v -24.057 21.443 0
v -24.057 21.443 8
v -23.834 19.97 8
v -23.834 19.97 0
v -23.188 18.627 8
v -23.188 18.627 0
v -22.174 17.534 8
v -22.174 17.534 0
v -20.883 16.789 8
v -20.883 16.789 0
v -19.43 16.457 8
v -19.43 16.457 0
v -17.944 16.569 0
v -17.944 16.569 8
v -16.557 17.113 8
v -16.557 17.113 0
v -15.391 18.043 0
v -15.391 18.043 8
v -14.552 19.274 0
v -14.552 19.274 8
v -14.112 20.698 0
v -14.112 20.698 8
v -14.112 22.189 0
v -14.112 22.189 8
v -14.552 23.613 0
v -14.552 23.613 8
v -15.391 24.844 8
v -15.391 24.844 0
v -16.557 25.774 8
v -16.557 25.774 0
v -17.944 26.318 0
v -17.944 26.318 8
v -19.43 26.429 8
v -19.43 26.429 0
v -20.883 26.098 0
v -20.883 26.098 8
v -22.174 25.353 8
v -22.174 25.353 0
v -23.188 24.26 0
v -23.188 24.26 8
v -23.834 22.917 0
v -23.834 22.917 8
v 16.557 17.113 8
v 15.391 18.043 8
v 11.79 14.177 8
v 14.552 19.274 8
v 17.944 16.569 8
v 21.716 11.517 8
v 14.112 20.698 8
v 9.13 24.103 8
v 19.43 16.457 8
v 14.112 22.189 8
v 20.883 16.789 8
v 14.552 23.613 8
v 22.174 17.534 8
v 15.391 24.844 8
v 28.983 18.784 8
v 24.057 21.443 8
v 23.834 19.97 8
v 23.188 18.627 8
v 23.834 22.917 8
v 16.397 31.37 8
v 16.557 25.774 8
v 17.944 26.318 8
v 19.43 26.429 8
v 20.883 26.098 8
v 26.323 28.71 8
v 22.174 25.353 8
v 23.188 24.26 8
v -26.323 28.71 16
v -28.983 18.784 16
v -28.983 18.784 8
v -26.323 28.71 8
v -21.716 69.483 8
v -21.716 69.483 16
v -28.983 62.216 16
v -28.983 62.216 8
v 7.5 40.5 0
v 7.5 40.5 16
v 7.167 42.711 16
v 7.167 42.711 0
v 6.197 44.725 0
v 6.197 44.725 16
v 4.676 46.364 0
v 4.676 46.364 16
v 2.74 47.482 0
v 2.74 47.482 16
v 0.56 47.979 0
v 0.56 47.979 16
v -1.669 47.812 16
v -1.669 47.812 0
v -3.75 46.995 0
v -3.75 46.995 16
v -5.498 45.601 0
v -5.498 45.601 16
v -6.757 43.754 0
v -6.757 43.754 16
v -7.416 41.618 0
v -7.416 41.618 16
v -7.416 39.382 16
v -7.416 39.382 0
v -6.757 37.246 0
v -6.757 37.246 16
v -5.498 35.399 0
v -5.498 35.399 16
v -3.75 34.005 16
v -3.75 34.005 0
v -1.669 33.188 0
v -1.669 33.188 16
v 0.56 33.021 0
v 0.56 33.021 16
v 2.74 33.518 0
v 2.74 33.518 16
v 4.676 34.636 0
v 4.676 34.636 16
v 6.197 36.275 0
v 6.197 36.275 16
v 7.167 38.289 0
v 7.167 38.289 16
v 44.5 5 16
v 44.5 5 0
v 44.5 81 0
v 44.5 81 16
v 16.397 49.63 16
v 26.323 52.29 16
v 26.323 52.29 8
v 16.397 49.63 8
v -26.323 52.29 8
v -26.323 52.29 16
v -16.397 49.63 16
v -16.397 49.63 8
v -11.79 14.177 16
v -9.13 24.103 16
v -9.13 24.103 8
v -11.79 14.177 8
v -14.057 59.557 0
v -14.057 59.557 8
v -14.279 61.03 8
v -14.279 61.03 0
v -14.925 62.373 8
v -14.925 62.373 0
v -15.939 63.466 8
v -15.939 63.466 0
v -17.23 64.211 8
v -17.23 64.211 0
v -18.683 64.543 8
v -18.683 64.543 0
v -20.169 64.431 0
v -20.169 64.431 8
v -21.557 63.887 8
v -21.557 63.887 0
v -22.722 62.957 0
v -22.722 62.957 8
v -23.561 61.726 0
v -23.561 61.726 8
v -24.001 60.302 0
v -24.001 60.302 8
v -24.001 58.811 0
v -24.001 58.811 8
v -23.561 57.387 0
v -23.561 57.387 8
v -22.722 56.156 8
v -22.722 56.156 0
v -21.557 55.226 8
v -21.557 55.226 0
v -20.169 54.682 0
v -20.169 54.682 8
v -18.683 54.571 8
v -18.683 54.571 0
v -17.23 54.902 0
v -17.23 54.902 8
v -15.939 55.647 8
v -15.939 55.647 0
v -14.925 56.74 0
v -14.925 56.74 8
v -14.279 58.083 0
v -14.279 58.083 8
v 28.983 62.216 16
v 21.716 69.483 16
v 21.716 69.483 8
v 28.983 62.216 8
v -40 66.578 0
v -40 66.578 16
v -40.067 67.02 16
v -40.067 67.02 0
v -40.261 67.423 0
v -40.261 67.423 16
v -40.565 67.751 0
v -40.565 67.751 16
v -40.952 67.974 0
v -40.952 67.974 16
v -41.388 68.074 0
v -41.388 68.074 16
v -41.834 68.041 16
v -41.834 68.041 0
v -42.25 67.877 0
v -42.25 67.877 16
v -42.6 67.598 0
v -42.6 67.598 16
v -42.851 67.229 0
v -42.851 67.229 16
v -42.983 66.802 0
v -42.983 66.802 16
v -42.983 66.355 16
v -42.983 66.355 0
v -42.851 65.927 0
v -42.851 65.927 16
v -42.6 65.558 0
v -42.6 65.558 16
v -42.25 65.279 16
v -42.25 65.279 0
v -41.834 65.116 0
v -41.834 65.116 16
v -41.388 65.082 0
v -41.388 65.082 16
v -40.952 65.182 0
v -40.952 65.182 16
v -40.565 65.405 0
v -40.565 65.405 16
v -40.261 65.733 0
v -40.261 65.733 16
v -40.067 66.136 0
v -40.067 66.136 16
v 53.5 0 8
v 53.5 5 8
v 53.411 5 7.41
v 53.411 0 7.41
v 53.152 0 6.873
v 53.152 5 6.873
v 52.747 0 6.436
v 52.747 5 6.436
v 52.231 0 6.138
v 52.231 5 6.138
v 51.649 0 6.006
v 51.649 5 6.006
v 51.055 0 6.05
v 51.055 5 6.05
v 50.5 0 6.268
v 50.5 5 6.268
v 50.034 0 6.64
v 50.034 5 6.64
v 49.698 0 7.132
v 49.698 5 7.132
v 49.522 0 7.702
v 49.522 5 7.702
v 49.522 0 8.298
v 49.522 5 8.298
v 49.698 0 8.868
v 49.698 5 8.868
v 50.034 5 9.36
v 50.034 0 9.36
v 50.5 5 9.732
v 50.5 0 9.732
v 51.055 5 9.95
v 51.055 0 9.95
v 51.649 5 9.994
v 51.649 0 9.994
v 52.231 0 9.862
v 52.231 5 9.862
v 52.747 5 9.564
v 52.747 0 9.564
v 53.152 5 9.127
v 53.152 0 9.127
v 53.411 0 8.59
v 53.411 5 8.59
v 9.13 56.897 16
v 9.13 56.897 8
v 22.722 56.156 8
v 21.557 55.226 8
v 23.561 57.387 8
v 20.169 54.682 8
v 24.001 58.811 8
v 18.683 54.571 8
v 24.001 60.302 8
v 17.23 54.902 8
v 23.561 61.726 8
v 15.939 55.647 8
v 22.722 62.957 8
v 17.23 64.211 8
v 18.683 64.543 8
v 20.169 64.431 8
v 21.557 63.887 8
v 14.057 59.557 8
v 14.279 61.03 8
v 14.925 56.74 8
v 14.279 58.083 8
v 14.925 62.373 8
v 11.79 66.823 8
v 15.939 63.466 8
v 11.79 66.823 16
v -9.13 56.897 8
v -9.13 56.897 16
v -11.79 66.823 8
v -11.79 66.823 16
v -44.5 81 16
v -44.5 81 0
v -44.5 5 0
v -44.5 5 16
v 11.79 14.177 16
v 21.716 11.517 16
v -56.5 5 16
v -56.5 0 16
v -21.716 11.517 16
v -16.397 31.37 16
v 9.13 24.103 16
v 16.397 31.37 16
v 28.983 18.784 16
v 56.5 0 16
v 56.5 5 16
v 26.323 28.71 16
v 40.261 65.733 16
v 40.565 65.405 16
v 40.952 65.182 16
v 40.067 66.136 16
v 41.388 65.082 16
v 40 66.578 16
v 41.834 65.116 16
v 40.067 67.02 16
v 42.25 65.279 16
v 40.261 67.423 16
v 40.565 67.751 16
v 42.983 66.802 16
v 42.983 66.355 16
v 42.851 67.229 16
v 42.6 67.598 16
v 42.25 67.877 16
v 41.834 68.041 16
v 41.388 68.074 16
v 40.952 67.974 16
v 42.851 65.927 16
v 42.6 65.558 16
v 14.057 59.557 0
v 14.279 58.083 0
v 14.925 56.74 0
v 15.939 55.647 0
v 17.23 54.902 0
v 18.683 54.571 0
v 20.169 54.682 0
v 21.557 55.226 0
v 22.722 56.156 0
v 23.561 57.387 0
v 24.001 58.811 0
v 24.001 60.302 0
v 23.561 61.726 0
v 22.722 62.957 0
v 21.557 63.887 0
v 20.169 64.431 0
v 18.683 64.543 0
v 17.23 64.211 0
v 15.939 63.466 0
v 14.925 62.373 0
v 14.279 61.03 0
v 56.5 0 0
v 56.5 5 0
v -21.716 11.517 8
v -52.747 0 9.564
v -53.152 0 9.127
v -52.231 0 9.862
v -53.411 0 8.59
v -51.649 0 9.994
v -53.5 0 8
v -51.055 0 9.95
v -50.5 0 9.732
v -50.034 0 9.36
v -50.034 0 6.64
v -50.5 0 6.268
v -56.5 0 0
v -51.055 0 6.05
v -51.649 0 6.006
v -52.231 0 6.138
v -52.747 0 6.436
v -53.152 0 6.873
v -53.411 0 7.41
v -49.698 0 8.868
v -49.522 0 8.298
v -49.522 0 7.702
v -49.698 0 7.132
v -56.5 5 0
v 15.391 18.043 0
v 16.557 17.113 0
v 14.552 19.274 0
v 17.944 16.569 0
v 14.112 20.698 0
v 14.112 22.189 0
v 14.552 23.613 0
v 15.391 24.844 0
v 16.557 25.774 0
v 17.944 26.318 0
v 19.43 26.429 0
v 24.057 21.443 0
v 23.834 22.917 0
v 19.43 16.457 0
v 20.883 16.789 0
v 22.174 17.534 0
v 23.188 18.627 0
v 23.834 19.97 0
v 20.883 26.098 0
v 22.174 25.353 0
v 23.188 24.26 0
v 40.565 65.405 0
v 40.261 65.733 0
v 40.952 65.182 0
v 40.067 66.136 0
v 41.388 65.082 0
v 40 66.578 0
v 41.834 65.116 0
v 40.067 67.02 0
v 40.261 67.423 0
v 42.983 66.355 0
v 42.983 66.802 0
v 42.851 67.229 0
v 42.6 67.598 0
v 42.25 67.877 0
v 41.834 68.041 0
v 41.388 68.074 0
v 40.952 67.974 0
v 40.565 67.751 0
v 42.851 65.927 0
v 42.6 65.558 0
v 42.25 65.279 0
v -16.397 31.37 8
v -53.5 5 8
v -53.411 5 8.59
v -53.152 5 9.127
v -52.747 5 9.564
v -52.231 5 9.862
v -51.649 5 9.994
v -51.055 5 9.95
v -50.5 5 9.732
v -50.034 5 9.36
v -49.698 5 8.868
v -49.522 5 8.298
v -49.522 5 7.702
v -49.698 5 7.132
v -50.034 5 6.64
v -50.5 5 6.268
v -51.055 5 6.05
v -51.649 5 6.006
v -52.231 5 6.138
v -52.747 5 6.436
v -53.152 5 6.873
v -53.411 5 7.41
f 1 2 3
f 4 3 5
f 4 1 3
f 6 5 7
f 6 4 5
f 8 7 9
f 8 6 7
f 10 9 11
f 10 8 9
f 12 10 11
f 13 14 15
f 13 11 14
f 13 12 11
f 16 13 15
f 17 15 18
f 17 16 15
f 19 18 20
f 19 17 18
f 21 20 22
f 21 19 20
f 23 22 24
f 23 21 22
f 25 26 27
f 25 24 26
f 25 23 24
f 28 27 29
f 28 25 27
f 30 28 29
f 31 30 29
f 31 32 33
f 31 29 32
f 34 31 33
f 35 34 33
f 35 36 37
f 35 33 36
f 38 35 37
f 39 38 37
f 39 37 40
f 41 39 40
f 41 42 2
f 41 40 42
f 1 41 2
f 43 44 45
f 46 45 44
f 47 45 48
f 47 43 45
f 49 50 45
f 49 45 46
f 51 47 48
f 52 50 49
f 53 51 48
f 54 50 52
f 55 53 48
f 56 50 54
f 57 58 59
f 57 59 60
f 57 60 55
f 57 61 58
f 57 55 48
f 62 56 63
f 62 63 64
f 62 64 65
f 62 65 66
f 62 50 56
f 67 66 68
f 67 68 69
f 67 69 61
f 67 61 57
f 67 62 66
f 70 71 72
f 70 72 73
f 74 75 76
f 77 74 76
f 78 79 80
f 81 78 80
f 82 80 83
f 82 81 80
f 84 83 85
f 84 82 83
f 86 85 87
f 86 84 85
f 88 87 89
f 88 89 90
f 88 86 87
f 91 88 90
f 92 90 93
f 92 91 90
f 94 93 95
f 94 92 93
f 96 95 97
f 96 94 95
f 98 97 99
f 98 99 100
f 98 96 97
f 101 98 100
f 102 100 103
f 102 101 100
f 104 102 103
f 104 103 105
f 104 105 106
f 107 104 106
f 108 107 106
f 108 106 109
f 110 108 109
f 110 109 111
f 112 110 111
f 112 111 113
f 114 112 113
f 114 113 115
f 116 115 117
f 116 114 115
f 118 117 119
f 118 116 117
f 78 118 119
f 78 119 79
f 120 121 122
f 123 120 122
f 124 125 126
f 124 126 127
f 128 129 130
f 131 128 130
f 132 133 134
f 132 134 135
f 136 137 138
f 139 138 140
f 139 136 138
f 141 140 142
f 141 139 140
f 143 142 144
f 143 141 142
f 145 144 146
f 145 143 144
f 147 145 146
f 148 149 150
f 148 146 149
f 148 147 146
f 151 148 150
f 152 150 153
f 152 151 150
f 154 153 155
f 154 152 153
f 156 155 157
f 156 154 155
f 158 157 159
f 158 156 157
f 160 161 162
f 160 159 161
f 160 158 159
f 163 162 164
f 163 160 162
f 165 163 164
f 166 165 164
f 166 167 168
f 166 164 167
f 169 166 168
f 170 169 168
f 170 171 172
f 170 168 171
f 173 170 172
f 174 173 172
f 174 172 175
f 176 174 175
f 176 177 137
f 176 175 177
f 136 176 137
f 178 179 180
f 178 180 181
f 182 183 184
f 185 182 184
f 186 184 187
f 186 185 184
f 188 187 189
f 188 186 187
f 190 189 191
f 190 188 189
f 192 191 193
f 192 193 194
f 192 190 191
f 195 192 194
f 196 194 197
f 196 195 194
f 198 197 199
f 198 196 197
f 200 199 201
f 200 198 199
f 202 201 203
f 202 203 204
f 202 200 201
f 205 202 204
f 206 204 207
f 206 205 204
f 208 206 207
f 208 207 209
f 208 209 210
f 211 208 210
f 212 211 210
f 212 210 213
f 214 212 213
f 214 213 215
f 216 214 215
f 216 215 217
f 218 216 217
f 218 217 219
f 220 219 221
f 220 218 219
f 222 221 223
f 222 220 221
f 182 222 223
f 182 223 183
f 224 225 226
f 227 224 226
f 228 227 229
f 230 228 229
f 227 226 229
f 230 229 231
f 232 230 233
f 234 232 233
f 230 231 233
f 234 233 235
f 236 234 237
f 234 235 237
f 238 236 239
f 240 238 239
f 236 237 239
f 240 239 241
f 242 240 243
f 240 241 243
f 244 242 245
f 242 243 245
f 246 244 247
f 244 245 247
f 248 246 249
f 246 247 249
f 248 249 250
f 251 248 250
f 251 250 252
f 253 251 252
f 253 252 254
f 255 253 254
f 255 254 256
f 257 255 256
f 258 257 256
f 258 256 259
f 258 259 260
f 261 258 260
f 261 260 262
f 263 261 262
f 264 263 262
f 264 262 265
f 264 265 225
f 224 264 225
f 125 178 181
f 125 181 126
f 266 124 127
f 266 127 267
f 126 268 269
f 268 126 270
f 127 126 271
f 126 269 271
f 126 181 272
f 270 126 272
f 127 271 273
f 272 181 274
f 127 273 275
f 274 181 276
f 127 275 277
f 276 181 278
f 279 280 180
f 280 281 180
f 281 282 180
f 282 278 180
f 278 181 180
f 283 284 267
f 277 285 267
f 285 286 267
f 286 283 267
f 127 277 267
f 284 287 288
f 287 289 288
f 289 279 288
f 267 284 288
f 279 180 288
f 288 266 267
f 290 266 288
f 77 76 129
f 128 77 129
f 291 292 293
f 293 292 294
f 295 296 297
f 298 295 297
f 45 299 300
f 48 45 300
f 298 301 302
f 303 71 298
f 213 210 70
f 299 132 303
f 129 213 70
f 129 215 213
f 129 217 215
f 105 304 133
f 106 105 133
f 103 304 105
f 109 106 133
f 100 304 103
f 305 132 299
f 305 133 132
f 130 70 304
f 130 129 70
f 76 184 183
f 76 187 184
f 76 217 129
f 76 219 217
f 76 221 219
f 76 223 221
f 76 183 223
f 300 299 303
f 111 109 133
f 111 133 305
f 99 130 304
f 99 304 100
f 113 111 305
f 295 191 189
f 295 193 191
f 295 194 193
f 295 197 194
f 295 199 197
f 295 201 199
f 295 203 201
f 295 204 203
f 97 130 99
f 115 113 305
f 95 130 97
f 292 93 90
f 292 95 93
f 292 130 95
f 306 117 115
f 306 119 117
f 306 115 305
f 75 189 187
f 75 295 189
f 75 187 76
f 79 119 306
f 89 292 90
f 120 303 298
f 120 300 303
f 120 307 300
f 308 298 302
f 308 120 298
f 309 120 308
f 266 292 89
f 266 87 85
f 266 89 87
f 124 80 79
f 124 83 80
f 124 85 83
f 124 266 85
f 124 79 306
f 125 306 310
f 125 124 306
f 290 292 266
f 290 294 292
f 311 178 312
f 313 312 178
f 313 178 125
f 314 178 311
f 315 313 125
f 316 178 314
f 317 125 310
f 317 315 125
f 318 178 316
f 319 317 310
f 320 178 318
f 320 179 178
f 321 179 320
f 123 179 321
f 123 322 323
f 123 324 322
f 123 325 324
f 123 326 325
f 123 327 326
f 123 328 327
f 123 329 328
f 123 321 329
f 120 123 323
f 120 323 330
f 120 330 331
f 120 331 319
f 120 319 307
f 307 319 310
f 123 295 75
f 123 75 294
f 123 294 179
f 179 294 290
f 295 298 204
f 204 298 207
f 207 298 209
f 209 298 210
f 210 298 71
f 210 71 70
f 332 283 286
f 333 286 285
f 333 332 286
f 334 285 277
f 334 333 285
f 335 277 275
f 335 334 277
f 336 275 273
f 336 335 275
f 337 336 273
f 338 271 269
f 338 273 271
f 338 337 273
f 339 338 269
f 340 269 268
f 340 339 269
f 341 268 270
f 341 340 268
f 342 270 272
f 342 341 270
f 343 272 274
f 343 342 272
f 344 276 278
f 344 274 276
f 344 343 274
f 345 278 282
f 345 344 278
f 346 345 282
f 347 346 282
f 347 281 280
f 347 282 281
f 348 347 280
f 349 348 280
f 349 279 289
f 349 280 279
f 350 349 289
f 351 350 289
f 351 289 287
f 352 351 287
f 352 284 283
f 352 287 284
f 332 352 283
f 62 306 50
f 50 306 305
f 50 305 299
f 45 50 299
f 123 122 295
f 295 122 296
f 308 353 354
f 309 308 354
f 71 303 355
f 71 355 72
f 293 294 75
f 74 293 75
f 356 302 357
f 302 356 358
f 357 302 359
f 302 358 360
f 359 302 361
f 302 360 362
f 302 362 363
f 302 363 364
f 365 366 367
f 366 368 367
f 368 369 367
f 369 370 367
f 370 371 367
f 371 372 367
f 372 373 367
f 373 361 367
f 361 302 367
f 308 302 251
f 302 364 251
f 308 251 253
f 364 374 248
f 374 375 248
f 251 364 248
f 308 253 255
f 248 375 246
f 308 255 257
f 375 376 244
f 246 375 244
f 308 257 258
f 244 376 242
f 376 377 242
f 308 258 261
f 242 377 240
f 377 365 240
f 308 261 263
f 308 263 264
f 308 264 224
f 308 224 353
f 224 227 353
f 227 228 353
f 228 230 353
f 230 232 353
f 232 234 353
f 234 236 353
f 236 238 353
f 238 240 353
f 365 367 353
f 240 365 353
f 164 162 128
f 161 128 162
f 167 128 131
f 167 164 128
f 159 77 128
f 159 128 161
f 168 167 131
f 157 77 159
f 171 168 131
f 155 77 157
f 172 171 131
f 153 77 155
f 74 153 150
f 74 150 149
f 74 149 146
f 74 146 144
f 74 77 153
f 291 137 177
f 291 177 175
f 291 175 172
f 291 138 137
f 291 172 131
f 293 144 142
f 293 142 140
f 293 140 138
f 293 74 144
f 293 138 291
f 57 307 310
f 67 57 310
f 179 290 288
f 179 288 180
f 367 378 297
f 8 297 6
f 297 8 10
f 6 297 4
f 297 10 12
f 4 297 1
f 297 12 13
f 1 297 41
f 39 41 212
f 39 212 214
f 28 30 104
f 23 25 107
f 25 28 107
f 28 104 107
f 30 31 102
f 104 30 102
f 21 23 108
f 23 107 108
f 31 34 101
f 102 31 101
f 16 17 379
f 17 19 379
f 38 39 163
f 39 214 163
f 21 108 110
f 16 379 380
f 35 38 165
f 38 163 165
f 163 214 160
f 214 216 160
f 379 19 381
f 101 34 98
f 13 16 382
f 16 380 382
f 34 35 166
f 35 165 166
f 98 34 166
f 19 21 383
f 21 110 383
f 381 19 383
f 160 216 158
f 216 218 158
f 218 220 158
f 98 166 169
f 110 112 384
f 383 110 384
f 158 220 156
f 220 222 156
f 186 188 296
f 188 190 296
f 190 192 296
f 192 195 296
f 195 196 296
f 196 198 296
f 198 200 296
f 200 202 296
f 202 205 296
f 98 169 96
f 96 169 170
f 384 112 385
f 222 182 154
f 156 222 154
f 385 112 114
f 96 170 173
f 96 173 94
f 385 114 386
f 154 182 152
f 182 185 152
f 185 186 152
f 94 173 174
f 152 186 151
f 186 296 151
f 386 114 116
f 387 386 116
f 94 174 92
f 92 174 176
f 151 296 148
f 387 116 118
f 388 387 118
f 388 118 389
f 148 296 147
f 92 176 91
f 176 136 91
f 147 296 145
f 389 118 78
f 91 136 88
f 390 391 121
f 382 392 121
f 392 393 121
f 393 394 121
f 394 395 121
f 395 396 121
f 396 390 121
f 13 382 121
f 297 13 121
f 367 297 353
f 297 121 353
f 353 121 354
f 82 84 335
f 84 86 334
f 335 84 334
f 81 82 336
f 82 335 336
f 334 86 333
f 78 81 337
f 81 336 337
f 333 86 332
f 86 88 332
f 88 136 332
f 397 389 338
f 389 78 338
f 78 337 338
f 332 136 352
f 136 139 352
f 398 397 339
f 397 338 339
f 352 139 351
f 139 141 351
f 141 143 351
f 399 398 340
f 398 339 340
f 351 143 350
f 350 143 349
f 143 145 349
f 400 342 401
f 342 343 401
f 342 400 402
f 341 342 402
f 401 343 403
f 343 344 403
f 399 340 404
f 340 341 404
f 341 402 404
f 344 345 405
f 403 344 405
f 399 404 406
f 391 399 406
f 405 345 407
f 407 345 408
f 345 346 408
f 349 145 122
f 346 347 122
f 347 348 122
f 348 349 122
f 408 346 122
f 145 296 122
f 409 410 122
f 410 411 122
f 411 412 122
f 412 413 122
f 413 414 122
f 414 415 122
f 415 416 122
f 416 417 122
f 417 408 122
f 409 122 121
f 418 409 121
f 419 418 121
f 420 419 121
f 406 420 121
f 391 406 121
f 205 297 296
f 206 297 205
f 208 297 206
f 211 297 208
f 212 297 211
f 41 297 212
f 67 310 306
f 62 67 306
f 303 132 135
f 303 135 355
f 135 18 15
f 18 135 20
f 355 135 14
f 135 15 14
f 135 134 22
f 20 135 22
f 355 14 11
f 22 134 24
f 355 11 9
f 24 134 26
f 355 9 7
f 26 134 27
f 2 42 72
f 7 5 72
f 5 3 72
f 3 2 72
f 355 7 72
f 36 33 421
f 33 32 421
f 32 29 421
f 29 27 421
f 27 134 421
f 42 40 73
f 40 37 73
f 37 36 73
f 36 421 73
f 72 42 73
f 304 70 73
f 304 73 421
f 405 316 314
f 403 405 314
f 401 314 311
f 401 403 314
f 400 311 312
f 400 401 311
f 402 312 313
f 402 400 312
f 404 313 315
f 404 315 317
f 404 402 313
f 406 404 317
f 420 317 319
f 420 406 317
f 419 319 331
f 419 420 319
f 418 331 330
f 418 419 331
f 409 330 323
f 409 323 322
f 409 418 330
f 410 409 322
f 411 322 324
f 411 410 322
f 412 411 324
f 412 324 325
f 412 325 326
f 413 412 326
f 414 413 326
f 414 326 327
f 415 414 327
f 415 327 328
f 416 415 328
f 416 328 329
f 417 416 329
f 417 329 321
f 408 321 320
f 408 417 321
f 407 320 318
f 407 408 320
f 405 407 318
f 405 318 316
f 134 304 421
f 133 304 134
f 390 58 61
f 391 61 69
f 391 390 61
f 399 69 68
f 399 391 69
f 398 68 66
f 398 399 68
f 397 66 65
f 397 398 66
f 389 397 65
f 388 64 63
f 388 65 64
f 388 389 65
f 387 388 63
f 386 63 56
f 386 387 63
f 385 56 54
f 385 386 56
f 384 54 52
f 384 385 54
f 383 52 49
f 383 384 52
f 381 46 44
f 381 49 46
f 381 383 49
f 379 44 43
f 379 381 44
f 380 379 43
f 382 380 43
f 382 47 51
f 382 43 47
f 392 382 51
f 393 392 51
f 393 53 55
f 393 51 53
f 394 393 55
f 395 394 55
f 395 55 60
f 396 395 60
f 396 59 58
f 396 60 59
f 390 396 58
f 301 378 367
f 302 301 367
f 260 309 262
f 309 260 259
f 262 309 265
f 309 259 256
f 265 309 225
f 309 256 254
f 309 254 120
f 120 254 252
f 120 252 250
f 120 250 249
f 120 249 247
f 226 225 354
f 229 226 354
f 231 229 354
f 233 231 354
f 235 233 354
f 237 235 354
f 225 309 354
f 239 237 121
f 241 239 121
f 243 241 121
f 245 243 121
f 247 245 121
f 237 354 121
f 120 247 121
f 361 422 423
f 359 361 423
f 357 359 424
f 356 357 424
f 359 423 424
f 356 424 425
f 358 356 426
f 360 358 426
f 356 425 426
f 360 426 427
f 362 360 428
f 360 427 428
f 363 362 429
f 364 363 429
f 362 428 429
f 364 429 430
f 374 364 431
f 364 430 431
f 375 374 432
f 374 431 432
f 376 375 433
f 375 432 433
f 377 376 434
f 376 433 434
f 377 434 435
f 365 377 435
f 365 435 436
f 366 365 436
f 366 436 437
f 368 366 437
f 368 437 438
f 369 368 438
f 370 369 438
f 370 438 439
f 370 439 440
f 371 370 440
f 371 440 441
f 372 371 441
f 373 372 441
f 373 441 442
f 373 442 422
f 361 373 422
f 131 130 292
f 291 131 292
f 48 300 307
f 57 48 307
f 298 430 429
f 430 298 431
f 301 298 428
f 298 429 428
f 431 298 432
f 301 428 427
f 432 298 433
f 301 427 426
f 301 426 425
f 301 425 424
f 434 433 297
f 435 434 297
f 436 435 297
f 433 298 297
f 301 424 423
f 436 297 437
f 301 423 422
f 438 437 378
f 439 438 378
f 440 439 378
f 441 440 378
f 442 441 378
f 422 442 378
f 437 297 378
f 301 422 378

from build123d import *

# Parameters (mm, degrees)
ESQUISSE2_R             = 5
ESQUISSE2_R_2           = 1.5
ESQUISSE2_R_3           = 7.5
BOSS_EXTRU_1_DEPTH      = 16
ESQUISSE4_R             = 2
ENL_V_MAT_EXTRU_1_DEPTH = 6
ENL_V_MAT_EXTRU_2_DEPTH = 8


with BuildPart() as part:
    # Esquisse2 → Boss.-Extru.1 (new body)
    with BuildSketch(Plane.XY):
        Polygon((-56.5, 0), (56.5, 0), (56.5, 5), (44.5, 5), (44.5, 81), (-44.5, 81), (-44.5, 5), (-56.5, 5), align=None)
        with Locations(Location((-19.056527753, 21.443472247, 0), (0, 0, 180))):  # turned: the seam where the file's is
            Circle(ESQUISSE2_R, mode=Mode.SUBTRACT)
        with Locations((-19.056527753, 59.556527753)):
            Circle(ESQUISSE2_R, mode=Mode.SUBTRACT)
        with Locations(Location((19.056527753, 59.556527753, 0), (0, 0, 180))):  # turned: the seam where the file's is
            Circle(ESQUISSE2_R, mode=Mode.SUBTRACT)
        with Locations((19.056527753, 21.443472247)):
            Circle(ESQUISSE2_R, mode=Mode.SUBTRACT)
        with Locations((-41.5, 66.578130392)):
            Circle(ESQUISSE2_R_2, mode=Mode.SUBTRACT)
        with Locations(Location((41.5, 66.578130392, 0), (0, 0, 180))):  # turned: the seam where the file's is
            Circle(ESQUISSE2_R_2, mode=Mode.SUBTRACT)
        with Locations((0, 40.5)):
            Circle(ESQUISSE2_R_3, mode=Mode.SUBTRACT)
    extrude(amount=BOSS_EXTRU_1_DEPTH)

    # Esquisse4 → Enlèv. mat.-Extru.1 (cut, through all)
    with BuildSketch(Plane(origin=(0, 5, 0), x_dir=(1, 0, 0), z_dir=(0, 1, 0))):
        with Locations(Location((-51.5, -8, 0), (0, 0, 180))):  # turned: the seam where the file's is
            Circle(ESQUISSE4_R)
        with Locations((51.5, -8)):
            Circle(ESQUISSE4_R)
    extrude(amount=-ENL_V_MAT_EXTRU_1_DEPTH, mode=Mode.SUBTRACT)

    # Esquisse5 → Enlèv. mat.-Extru.2 (cut)
    with BuildSketch(Plane.XY.offset(16)):
        Polygon((-21.71636832, 69.483187891), (-28.983187891, 62.21636832), (-26.323347323, 52.289708183), (-16.396687186, 49.629867615), (-9.129867615, 56.896687186), (-11.789708183, 66.823347323), align=None)
        Polygon((-21.71636832, 11.516812109), (-28.983187891, 18.78363168), (-26.323347323, 28.710291817), (-16.396687186, 31.370132385), (-9.129867615, 24.103312814), (-11.789708183, 14.176652677), align=None)
        Polygon((26.323347323, 52.289708183), (16.396687186, 49.629867615), (9.129867615, 56.896687186), (11.789708183, 66.823347323), (21.71636832, 69.483187891), (28.983187891, 62.21636832), align=None)
        Polygon((16.396687186, 31.370132385), (9.129867615, 24.103312814), (11.789708183, 14.176652677), (21.71636832, 11.516812109), (28.983187891, 18.78363168), (26.323347323, 28.710291817), align=None)
    extrude(amount=-ENL_V_MAT_EXTRU_2_DEPTH, mode=Mode.SUBTRACT)


solid = part.part
